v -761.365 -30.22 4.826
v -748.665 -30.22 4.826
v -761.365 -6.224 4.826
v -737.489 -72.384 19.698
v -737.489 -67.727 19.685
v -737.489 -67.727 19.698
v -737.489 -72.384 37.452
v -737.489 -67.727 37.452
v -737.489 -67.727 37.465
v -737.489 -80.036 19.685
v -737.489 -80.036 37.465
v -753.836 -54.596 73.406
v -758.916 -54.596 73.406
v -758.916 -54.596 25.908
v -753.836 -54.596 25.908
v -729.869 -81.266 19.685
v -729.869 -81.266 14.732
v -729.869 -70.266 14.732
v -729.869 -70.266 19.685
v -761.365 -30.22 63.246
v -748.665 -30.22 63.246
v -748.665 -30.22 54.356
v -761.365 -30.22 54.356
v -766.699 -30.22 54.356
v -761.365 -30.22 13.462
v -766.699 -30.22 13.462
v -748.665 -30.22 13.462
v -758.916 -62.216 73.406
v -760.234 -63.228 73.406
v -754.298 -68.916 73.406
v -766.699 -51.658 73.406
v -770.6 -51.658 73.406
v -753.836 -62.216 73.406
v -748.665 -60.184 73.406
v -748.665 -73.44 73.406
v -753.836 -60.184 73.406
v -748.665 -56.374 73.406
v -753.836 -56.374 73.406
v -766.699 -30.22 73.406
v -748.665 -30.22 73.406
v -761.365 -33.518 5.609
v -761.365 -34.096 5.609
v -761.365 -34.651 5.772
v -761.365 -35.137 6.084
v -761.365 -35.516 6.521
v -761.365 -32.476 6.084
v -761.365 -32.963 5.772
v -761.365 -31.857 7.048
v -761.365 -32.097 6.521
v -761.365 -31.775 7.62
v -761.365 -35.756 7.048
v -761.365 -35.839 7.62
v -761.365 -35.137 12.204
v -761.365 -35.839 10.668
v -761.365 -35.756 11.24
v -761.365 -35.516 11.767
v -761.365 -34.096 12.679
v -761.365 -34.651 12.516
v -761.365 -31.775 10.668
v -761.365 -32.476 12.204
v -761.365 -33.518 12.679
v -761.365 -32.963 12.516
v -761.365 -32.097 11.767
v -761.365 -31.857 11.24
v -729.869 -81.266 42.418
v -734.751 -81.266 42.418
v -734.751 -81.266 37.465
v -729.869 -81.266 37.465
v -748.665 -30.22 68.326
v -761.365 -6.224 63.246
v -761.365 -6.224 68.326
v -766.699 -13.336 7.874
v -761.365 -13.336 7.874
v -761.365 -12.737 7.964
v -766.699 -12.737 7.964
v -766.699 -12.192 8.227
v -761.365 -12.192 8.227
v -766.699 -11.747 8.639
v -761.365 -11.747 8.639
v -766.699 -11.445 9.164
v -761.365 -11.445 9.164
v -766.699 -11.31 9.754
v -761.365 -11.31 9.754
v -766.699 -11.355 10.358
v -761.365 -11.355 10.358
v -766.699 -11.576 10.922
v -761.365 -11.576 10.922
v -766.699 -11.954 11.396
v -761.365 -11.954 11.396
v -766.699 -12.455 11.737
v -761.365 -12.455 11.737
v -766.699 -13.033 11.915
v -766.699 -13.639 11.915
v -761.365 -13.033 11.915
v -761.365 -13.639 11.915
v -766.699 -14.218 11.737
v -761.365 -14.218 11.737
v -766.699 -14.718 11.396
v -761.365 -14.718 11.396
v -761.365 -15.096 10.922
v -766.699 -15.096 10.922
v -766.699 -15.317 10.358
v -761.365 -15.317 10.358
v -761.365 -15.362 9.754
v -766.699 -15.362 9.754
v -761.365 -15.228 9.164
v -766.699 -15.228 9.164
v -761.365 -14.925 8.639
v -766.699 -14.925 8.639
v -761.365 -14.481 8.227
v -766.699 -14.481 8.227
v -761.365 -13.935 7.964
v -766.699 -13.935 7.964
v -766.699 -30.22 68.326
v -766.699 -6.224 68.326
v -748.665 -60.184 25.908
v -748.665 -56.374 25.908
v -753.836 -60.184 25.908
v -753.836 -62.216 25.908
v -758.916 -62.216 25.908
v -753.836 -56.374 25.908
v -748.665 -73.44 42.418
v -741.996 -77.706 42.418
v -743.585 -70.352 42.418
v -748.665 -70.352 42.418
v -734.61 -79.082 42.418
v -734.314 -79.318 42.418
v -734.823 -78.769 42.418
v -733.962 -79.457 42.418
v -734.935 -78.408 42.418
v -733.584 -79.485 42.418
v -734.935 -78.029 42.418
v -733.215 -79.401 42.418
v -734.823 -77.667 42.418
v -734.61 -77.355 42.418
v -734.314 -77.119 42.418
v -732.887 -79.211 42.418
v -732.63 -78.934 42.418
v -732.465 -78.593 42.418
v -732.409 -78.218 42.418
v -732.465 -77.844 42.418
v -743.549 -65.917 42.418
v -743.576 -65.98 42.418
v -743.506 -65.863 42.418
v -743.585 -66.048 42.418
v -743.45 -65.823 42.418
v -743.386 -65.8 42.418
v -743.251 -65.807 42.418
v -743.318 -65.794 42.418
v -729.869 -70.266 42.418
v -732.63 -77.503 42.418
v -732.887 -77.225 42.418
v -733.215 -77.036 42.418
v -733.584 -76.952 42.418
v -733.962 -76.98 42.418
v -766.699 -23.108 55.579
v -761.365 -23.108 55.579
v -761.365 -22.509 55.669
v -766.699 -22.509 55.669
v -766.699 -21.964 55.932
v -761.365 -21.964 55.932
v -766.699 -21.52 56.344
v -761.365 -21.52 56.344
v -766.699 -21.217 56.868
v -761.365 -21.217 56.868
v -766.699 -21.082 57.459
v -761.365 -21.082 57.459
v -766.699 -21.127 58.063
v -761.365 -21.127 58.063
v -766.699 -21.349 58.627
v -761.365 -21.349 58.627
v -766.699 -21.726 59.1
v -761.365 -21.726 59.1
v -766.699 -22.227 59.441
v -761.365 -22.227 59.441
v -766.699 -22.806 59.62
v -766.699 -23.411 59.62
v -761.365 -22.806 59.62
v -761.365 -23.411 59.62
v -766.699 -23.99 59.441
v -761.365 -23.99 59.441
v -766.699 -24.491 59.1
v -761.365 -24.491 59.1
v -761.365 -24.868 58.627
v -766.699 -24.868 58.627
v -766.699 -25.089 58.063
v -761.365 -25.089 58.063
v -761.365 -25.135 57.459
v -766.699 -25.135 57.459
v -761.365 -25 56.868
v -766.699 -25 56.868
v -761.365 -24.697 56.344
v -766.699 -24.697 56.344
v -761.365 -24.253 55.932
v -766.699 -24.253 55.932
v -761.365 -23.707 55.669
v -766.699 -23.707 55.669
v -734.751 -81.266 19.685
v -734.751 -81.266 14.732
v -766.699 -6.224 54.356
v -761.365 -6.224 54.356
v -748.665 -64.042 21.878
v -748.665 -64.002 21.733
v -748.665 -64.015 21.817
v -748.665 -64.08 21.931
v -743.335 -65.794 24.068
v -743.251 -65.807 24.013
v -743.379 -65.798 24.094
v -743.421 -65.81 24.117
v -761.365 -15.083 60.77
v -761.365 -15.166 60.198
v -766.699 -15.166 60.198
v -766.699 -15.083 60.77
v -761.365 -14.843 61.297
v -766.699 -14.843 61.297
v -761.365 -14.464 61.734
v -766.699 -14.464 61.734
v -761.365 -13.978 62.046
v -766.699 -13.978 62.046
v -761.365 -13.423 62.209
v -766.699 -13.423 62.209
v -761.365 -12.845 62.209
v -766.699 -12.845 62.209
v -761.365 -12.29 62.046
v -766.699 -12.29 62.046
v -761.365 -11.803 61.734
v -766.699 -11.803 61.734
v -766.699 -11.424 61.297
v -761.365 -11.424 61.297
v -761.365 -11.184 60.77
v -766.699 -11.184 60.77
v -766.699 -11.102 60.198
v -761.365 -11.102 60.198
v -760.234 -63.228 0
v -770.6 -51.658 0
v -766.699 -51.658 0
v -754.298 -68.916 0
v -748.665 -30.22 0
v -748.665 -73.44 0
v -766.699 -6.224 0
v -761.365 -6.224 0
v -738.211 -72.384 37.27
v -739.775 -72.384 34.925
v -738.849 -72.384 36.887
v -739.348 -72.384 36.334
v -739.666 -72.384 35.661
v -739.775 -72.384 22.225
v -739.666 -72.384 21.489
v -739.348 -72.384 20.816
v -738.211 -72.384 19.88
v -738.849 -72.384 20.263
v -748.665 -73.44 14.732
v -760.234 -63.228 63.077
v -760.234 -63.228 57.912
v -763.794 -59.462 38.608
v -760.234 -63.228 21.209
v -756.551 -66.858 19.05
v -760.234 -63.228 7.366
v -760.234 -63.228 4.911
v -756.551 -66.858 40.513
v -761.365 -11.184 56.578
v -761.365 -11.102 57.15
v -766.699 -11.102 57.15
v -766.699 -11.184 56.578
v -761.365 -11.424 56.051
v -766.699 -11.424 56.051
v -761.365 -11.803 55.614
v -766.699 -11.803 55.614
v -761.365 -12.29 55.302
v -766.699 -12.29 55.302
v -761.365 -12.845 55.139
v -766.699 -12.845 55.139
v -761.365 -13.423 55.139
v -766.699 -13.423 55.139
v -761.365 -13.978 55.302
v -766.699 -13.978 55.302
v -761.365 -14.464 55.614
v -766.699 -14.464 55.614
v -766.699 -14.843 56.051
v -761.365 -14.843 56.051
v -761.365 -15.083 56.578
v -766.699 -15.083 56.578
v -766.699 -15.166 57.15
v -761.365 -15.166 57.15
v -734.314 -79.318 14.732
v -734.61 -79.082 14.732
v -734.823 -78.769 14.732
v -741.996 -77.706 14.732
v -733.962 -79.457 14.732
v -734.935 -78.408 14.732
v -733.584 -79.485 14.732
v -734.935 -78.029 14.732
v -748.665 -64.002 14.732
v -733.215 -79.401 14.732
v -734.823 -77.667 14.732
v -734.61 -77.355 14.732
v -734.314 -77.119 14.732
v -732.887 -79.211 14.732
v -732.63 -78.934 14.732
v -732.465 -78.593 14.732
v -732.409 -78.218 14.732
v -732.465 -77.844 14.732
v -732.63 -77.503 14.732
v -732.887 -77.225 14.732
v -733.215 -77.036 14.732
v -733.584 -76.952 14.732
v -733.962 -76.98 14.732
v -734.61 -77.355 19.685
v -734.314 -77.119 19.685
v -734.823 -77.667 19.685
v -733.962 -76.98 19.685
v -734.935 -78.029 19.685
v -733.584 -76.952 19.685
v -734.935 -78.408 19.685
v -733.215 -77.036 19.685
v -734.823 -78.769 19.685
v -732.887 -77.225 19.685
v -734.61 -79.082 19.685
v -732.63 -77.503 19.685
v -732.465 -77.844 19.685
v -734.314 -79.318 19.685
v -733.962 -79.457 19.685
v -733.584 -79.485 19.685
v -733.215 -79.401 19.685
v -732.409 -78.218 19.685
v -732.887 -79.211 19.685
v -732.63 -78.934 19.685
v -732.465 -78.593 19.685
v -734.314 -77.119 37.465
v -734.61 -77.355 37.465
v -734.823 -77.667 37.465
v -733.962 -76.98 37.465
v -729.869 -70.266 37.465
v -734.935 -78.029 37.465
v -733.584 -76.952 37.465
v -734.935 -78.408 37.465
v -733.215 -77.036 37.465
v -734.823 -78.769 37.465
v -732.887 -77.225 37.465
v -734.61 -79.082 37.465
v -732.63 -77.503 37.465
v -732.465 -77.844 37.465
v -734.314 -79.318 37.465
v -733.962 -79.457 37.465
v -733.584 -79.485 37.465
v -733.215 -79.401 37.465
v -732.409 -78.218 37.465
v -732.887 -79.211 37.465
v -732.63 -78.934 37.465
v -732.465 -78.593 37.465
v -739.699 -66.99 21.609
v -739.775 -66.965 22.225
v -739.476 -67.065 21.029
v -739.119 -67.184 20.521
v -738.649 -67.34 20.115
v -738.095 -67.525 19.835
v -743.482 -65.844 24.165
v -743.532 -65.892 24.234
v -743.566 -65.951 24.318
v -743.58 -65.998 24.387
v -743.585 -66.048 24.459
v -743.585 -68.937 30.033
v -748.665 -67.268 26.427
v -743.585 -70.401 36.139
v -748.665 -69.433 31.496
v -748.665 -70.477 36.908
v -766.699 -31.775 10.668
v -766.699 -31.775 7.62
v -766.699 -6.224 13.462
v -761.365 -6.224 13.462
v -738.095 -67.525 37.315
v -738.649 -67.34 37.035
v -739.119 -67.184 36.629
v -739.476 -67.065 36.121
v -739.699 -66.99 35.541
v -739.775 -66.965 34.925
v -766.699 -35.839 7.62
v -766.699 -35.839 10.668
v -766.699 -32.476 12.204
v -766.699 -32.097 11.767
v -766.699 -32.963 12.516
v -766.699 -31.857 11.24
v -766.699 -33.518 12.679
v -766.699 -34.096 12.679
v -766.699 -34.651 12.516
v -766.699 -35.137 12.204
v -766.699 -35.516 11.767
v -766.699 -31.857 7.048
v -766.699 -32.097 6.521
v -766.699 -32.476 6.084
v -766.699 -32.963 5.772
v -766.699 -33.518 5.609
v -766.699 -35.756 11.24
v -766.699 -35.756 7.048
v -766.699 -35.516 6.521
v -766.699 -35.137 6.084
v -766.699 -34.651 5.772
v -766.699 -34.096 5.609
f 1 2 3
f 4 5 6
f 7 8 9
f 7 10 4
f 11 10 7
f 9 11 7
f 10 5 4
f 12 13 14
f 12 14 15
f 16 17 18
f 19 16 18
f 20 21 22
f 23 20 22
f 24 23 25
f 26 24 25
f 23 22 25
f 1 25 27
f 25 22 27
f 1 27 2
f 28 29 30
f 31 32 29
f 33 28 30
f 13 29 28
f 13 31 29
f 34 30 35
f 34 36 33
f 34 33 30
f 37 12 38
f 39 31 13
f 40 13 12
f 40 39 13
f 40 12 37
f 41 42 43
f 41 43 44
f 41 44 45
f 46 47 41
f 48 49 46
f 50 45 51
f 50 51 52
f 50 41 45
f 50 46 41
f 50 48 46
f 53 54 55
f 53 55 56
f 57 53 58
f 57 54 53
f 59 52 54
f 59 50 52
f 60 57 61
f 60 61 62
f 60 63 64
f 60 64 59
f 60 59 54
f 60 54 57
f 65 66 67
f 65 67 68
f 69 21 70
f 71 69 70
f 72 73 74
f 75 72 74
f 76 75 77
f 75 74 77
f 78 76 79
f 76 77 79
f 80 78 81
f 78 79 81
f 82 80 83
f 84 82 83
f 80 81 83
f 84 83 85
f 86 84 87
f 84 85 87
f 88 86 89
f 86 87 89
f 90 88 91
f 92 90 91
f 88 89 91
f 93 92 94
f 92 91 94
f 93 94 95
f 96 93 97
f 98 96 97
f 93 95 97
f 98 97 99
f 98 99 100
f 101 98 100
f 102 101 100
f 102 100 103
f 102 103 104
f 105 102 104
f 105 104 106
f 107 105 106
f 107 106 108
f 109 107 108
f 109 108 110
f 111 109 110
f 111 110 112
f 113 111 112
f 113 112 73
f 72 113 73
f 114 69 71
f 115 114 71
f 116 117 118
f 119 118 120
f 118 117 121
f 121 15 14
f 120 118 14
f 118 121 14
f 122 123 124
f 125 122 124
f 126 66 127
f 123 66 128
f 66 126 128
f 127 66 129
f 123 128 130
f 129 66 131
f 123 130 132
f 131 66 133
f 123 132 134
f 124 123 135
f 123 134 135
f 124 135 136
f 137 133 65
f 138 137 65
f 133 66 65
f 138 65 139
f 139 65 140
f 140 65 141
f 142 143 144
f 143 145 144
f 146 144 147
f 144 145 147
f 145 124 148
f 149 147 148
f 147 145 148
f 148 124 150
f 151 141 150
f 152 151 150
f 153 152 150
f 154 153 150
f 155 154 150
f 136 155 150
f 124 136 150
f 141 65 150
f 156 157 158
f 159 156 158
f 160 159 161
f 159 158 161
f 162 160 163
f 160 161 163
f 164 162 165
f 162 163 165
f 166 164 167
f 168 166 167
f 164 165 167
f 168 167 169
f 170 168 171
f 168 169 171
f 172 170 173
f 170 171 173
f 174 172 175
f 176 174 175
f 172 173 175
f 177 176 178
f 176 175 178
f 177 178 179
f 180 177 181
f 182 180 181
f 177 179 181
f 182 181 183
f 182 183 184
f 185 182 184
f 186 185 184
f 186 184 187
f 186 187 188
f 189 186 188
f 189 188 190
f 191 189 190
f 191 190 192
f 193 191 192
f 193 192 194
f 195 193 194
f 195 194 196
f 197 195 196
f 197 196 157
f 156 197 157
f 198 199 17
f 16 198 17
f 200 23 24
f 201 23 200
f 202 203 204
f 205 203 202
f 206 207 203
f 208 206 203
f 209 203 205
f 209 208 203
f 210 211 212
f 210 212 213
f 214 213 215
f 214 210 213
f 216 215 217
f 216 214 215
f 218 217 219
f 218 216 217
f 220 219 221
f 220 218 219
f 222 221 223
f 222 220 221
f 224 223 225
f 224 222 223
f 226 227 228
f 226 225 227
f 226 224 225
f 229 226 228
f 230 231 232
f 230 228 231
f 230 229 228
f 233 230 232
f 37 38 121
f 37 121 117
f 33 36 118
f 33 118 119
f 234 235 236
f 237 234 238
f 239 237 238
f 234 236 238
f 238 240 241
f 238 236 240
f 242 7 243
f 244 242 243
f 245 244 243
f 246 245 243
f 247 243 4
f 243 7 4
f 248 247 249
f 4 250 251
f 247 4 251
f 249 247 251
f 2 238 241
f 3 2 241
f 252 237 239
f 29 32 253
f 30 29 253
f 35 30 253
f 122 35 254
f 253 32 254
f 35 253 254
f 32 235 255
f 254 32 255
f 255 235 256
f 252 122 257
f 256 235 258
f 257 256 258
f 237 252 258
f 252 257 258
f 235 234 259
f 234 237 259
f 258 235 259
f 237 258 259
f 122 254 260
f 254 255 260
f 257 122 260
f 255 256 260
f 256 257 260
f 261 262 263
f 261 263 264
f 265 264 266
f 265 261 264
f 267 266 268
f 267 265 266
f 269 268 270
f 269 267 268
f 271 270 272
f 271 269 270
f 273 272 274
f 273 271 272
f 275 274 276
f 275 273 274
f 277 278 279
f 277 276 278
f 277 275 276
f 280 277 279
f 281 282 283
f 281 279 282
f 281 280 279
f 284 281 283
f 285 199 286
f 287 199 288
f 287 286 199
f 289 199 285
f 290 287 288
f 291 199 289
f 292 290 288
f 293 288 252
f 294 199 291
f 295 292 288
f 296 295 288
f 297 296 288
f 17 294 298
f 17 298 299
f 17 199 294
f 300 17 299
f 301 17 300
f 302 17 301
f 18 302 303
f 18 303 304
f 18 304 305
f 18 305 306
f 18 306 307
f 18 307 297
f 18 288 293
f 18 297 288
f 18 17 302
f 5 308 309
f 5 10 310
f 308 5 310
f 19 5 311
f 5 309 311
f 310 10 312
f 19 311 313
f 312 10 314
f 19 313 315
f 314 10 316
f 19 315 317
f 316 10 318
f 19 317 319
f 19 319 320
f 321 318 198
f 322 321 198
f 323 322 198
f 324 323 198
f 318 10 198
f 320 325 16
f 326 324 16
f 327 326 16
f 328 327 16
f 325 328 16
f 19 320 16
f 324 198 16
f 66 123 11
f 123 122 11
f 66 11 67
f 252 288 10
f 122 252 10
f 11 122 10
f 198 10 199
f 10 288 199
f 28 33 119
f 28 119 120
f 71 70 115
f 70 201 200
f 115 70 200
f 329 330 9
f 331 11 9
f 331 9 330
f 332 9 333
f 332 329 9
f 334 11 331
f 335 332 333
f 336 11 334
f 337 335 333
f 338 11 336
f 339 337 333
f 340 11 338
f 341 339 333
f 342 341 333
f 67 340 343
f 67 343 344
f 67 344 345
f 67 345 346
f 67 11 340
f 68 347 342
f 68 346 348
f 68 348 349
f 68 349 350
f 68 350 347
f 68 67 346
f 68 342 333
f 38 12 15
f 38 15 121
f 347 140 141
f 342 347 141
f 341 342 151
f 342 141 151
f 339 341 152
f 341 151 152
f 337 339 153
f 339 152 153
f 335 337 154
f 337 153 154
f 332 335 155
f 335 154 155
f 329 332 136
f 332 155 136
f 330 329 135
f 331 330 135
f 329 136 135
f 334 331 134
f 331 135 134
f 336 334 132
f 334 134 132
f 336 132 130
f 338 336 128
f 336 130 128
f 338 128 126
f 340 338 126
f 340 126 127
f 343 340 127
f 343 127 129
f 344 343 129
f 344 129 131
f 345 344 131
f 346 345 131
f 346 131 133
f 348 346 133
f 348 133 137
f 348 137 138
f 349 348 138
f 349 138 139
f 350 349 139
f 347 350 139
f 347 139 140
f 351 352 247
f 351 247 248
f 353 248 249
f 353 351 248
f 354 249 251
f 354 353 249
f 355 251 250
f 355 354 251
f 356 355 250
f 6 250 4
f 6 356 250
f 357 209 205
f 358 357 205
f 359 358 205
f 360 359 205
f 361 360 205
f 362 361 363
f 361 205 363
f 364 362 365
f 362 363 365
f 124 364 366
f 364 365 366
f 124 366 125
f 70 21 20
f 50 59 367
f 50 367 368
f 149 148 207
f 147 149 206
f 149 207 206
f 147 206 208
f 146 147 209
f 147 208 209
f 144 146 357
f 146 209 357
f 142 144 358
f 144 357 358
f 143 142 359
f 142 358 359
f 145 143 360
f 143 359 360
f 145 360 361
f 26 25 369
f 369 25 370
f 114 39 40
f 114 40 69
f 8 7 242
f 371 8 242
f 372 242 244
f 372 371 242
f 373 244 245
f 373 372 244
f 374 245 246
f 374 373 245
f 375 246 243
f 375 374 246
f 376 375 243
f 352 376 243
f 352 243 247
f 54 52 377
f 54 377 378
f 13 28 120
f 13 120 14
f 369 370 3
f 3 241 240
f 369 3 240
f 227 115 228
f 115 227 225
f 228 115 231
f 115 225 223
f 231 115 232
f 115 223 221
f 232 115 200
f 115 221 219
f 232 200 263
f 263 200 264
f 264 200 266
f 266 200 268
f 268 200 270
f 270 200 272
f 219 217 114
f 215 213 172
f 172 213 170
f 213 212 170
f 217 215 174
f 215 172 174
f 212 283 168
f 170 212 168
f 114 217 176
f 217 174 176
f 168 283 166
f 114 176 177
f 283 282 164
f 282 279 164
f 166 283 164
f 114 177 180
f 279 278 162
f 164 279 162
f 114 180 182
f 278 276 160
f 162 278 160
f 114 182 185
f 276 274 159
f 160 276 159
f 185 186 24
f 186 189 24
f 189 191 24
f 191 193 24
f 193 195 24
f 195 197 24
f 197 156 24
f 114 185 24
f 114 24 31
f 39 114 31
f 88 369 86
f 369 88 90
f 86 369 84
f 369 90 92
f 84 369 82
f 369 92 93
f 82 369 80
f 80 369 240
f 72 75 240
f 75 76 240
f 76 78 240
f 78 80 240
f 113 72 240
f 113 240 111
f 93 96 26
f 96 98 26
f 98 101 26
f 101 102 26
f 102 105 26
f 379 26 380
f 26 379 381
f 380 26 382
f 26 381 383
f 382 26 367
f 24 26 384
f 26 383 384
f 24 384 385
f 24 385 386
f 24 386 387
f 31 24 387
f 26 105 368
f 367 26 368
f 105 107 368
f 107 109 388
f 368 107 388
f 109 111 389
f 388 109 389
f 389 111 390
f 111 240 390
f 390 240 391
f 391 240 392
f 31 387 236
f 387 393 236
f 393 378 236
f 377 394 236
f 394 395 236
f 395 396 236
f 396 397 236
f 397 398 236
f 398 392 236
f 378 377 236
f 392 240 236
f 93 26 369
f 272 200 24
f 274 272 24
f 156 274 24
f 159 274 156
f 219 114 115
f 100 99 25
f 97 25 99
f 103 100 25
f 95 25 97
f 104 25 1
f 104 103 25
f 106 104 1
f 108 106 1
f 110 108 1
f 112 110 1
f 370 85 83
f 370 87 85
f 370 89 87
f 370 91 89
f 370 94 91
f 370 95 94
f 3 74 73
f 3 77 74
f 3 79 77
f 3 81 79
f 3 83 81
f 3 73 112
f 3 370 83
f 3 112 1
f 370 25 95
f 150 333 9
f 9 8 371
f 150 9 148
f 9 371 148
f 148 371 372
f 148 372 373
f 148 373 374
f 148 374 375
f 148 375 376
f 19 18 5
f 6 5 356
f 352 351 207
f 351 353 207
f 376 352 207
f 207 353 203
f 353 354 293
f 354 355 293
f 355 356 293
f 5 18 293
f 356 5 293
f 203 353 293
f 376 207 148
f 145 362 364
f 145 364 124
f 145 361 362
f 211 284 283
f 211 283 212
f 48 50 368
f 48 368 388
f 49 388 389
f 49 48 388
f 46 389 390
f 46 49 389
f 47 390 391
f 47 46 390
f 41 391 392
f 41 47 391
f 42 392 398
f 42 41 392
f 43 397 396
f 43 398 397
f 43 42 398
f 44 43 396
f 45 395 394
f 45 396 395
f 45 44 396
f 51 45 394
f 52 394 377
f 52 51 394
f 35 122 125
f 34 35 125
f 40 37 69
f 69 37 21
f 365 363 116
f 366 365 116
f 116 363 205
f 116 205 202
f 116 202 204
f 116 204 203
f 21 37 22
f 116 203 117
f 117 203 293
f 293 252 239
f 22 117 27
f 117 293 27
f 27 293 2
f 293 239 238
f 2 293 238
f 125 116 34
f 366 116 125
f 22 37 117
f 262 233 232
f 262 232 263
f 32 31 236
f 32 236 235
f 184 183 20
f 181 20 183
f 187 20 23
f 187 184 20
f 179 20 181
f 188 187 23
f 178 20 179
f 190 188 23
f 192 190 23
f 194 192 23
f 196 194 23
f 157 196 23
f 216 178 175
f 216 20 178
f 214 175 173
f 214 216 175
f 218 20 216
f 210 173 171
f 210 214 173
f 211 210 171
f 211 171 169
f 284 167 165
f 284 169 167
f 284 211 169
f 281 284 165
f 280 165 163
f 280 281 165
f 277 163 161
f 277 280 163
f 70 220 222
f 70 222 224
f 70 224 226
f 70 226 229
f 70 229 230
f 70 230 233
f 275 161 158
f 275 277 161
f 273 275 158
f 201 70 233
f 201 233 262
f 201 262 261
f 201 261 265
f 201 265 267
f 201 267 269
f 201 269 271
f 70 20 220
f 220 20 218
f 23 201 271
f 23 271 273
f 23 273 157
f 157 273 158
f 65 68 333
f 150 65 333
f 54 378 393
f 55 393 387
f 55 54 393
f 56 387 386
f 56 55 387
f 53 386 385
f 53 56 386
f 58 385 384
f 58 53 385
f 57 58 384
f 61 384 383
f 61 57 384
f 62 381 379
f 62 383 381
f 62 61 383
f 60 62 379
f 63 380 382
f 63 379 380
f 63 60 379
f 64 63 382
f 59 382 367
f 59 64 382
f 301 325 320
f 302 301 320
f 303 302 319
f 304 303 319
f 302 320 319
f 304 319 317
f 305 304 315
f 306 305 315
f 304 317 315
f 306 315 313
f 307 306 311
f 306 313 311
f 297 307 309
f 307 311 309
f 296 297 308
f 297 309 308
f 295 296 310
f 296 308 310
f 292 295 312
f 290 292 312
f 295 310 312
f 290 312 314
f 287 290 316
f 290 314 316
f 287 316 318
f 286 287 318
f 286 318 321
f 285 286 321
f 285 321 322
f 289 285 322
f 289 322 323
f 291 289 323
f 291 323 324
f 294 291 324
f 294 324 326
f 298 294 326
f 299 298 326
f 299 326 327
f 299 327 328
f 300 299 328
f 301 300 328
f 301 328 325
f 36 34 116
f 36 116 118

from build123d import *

# Parameters (mm, degrees)
BOSS_EXTRUDE1_DEPTH = 73.406
SKETCH2_W           = 5.08
SKETCH2_H           = 23.996252619
SKETCH2_W_2         = 40.894
CUT_EXTRUDE1_DEPTH  = 112.686247001
SKETCH3_W           = 58.42
SKETCH3_H           = 23.996252619
CUT_EXTRUDE2_DEPTH  = 12.7
SKETCH4_R           = 2.032
CUT_EXTRUDE3_DEPTH  = 114.950293405
SKETCH5_W           = 30.988
SKETCH5_H           = 17.263986836
SKETCH5_W_2         = 14.732
CUT_EXTRUDE4_DEPTH  = 18.796
CUT_EXTRUDE5_DEPTH  = 47.498
SKETCH7_W           = 7.62
SKETCH7_H           = 17.78
CUT_EXTRUDE6_DEPTH  = 22.098
CUT_EXTRUDE7_DEPTH  = 42.164
SKETCH9_R           = 1.27
CUT_EXTRUDE8_DEPTH  = 777.033475109
CUT_EXTRUDE9_DEPTH  = 5.08
FILLET1_R           = 0.254


with BuildPart() as part:
    # Sketch1 → Boss-Extrude1 (new body)
    with BuildSketch(Plane.XY):
        with BuildLine():
            Line((-748.665, -64.002429831), (-748.665, -30.220429831))
            Line((-748.665, -30.220429831), (-761.365, -6.224177212))
            Line((-761.365, -6.224177212), (-766.699, -6.224177212))
            Line((-766.699, -6.224177212), (-766.699, -51.658164167))
            Line((-766.699, -51.658164167), (-770.600050032, -51.658164167))
            add(Edge.make_bspline(
                [(-770.600050032, -51.658164167), (-769.474110637, -53.020450544), (-766.896191207, -56.054888677), (-762.734517182, -60.657959907), (-758.1103328, -65.445789554), (-753.453331209, -69.75760173), (-750.223005304, -72.311764833), (-748.665, -73.440199402)],
                knots=[0.071886948, 0.071886948, 0.071886948, 0.071886948, 0.078125, 0.0859375, 0.09375, 0.1015625, 0.108408754, 0.108408754, 0.108408754, 0.108408754], degree=3))
            Line((-748.665, -73.440199402), (-748.665, -64.002429831))
        make_face()
        with BuildLine():
            Line((-729.869, -70.265959359), (-748.665, -64.002429831))
            Line((-748.665, -64.002429831), (-748.665, -73.440199402))
            add(Edge.make_bspline(
                [(-748.665, -73.440199402), (-748.445110963, -73.599460985), (-744.652568783, -76.312065429), (-739.987854595, -78.967573397), (-735.357324532, -81.008335743), (-734.751026936, -81.266416667)],
                knots=[0.108408754, 0.108408754, 0.108408754, 0.108408754, 0.109375, 0.125, 0.127339677, 0.127339677, 0.127339677, 0.127339677], degree=3))
            Line((-734.751026936, -81.266416667), (-729.869, -81.266416667))
            Line((-729.869, -81.266416667), (-729.869, -70.265959359))
        make_face()
    extrude(amount=BOSS_EXTRUDE1_DEPTH)

    # Sketch2 → Cut-Extrude1 (cut, through all)
    with BuildSketch(Plane(origin=(-748.665, 0, 0), x_dir=(0, 0, -1), z_dir=(1, 0, 0))):
        with Locations((-70.866, -18.222303522)):
            Rectangle(SKETCH2_W, SKETCH2_H)
        with Locations((-33.909, -18.222303522)):
            Rectangle(SKETCH2_W_2, SKETCH2_H)
    extrude(amount=-CUT_EXTRUDE1_DEPTH, mode=Mode.SUBTRACT)

    # Sketch3 → Cut-Extrude2 (cut)
    with BuildSketch(Plane(origin=(-748.665, 0, 0), x_dir=(0, 0, -1), z_dir=(1, 0, 0))):
        with Locations((-34.036, -18.222303522)):
            Rectangle(SKETCH3_W, SKETCH3_H)
    extrude(amount=-CUT_EXTRUDE2_DEPTH, mode=Mode.SUBTRACT)

    # Sketch4 → Cut-Extrude3 (cut, through all)
    with BuildSketch(Plane(origin=(-761.365, 0, 0), x_dir=(0, 0, -1), z_dir=(1, 0, 0))):
        with Locations((-57.610523574, -23.108429831)):
            Circle(SKETCH4_R)
        with Locations((-9.906, -13.336177212)):
            Circle(SKETCH4_R)
        with BuildLine():
            Line((-60.198, -11.101802223), (-57.15, -11.101802223))
            ThreePointArc((-57.15, -11.101802223), (-55.118, -13.133802223), (-57.15, -15.165802223))
            Line((-57.15, -15.165802223), (-60.198, -15.165802223))
            ThreePointArc((-60.198, -15.165802223), (-62.23, -13.133802223), (-60.198, -11.101802223))
        make_face()
        with BuildLine():
            Line((-10.668, -31.774706288), (-7.62, -31.774706288))
            ThreePointArc((-7.62, -31.774706288), (-5.588, -33.806706288), (-7.62, -35.838706288))
            Line((-7.62, -35.838706288), (-10.668, -35.838706288))
            ThreePointArc((-10.668, -35.838706288), (-12.7, -33.806706288), (-10.668, -31.774706288))
        make_face()
    extrude(amount=-CUT_EXTRUDE3_DEPTH, mode=Mode.SUBTRACT)

    # Sketch5 → Cut-Extrude4 (cut)
    with BuildSketch(Plane(origin=(-729.869, 0, 0), x_dir=(0, 0, -1), z_dir=(1, 0, 0))):
        with Locations((-57.912, -72.634423249)):
            Rectangle(SKETCH5_W, SKETCH5_H)
        with Locations((-7.366, -72.634423249)):
            Rectangle(SKETCH5_W_2, SKETCH5_H)
    extrude(amount=-CUT_EXTRUDE4_DEPTH, mode=Mode.SUBTRACT)

    # Sketch6 → Cut-Extrude5 (cut)
    with BuildSketch(Plane.XY.offset(73.406)):
        Polygon((-748.665, -56.374416667), (-748.665, -60.184416667), (-753.836367364, -60.184416667), (-753.836367364, -62.216416667), (-758.916367364, -62.216416667), (-758.916367364, -54.596416667), (-753.836367364, -54.596416667), (-753.836367364, -56.374416667), align=None)
    extrude(amount=-CUT_EXTRUDE5_DEPTH, mode=Mode.SUBTRACT)

    # Sketch7 → Cut-Extrude6 (cut)
    with BuildSketch(Plane.XZ.offset(81.266416667)):
        with Locations((-733.679, 28.575)):
            Rectangle(SKETCH7_W, SKETCH7_H)
    extrude(amount=-CUT_EXTRUDE6_DEPTH, mode=Mode.SUBTRACT)

    # Sketch8 → Cut-Extrude7 (cut)
    with BuildSketch(Plane(origin=(0, -30.220429831, 0), x_dir=(1, 0, 0), z_dir=(0, 1, 0))):
        with BuildLine():
            Line((-729.869, -37.465), (-737.235, -37.465))
            ThreePointArc((-737.235, -37.465), (-739.031051224, -36.721051224), (-739.775, -34.925))
            Line((-739.775, -34.925), (-739.775, -22.225))
            ThreePointArc((-739.775, -22.225), (-739.031051224, -20.428948776), (-737.235, -19.685))
            Line((-737.235, -19.685), (-729.869, -19.685))
            Line((-729.869, -19.685), (-729.869, -37.465))
        make_face()
    extrude(amount=-CUT_EXTRUDE7_DEPTH, mode=Mode.SUBTRACT)

    # Sketch9 → Cut-Extrude8 (cut, through all)
    with BuildSketch(Plane.XY.offset(42.418)):
        with Locations((-733.679, -78.218416667)):
            Circle(SKETCH9_R)
    extrude(amount=-CUT_EXTRUDE8_DEPTH, mode=Mode.SUBTRACT)

    # Sketch12 → Cut-Extrude9 (cut)
    with BuildSketch(Plane(origin=(-748.665, 0, 0), x_dir=(0, 0, -1), z_dir=(1, 0, 0))):
        with BuildLine():
            Line((-42.418, -64.002429831), (-21.844, -64.002429831))
            ThreePointArc((-21.844, -64.002429831), (-31.440091509, -69.415973341), (-42.418, -70.352429831))
            Line((-42.418, -70.352429831), (-42.418, -64.002429831))
        make_face()
    extrude(amount=CUT_EXTRUDE9_DEPTH, mode=Mode.SUBTRACT)

    # Fillet1
    fillet1_edges = [part.edges().sort_by_distance(p)[0] for p in [
        (-743.585, -65.69527565, 33.18708051),
        (-746.106672699, -64.854960082, 22.851173008),
    ]]
    fillet(fillet1_edges, radius=FILLET1_R)


solid = part.part
